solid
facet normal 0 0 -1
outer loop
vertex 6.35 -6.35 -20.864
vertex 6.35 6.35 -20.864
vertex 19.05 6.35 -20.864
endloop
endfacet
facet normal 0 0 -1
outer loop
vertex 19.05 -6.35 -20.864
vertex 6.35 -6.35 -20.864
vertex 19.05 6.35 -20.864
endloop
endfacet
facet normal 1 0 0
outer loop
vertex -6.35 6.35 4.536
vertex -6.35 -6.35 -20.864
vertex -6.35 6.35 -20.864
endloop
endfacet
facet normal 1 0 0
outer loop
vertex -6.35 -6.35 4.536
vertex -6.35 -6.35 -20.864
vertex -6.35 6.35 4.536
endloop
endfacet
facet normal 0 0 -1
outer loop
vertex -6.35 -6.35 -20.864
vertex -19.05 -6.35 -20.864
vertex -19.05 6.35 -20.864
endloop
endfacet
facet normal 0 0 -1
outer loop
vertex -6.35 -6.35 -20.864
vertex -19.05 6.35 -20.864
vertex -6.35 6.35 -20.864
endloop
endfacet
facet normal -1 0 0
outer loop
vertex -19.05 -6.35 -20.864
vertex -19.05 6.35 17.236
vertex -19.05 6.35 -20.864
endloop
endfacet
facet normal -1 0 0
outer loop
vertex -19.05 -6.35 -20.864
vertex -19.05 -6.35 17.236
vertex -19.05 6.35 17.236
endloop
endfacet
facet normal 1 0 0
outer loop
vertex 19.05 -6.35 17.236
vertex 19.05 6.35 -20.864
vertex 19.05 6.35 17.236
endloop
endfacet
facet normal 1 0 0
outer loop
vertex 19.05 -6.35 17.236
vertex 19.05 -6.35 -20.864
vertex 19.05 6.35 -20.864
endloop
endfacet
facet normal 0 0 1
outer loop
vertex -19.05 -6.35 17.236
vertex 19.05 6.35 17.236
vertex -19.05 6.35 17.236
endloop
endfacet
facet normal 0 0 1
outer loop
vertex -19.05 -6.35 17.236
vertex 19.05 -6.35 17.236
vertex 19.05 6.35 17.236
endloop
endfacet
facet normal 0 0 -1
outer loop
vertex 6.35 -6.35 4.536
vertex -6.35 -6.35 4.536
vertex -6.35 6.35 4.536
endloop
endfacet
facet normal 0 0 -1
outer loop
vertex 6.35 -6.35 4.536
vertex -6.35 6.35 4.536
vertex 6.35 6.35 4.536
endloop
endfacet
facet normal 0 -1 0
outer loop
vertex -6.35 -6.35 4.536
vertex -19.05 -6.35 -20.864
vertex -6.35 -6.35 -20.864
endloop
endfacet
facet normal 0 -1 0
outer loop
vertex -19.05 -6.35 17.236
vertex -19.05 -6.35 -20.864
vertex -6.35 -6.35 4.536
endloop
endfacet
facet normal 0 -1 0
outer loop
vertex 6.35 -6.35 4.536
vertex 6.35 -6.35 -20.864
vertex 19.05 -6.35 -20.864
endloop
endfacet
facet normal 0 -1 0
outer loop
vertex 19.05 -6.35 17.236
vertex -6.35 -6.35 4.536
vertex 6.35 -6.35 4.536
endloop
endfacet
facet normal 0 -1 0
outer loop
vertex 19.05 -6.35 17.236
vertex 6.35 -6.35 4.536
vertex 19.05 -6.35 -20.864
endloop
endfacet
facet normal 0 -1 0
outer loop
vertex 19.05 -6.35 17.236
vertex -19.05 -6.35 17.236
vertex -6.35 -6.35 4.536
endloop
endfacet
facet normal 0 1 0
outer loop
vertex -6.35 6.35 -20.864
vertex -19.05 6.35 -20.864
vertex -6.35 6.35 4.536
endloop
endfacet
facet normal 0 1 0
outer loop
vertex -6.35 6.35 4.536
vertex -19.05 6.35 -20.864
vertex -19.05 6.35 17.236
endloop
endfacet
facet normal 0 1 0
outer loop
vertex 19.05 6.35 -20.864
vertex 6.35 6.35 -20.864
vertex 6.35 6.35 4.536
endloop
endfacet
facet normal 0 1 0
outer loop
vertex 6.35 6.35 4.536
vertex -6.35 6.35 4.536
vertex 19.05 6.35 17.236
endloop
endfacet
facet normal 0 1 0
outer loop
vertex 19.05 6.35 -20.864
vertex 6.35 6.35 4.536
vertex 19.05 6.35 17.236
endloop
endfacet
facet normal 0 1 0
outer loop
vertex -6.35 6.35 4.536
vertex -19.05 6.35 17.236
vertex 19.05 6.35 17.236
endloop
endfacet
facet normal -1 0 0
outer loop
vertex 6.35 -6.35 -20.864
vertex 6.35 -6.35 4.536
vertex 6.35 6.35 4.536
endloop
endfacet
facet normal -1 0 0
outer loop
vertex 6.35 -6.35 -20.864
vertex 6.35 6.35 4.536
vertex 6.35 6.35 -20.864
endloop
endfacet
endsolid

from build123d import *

# Parameters (mm, degrees)
F0_W     = 12.7
F0_H     = 12.7
F1_DEPTH = 6.35


with BuildPart() as f1:
    # F0 (on Front) → F1 (new body, symmetric)
    with BuildSketch(Plane.XZ):
        with Locations((-12.7, 10.885714)):
            Rectangle(F0_W, F0_H)
        with Locations((0, 10.885714)):
            Rectangle(F0_W, F0_H)
        with Locations((-12.7, -1.814286)):
            Rectangle(F0_W, F0_H)
        with Locations((12.7, 10.885714)):
            Rectangle(F0_W, F0_H)
        with Locations((-12.7, -14.514286)):
            Rectangle(F0_W, F0_H)
        with Locations((12.7, -1.814286)):
            Rectangle(F0_W, F0_H)
        with Locations((12.7, -14.514286)):
            Rectangle(F0_W, F0_H)
    extrude(amount=F1_DEPTH, both=True)


solid = f1.part
